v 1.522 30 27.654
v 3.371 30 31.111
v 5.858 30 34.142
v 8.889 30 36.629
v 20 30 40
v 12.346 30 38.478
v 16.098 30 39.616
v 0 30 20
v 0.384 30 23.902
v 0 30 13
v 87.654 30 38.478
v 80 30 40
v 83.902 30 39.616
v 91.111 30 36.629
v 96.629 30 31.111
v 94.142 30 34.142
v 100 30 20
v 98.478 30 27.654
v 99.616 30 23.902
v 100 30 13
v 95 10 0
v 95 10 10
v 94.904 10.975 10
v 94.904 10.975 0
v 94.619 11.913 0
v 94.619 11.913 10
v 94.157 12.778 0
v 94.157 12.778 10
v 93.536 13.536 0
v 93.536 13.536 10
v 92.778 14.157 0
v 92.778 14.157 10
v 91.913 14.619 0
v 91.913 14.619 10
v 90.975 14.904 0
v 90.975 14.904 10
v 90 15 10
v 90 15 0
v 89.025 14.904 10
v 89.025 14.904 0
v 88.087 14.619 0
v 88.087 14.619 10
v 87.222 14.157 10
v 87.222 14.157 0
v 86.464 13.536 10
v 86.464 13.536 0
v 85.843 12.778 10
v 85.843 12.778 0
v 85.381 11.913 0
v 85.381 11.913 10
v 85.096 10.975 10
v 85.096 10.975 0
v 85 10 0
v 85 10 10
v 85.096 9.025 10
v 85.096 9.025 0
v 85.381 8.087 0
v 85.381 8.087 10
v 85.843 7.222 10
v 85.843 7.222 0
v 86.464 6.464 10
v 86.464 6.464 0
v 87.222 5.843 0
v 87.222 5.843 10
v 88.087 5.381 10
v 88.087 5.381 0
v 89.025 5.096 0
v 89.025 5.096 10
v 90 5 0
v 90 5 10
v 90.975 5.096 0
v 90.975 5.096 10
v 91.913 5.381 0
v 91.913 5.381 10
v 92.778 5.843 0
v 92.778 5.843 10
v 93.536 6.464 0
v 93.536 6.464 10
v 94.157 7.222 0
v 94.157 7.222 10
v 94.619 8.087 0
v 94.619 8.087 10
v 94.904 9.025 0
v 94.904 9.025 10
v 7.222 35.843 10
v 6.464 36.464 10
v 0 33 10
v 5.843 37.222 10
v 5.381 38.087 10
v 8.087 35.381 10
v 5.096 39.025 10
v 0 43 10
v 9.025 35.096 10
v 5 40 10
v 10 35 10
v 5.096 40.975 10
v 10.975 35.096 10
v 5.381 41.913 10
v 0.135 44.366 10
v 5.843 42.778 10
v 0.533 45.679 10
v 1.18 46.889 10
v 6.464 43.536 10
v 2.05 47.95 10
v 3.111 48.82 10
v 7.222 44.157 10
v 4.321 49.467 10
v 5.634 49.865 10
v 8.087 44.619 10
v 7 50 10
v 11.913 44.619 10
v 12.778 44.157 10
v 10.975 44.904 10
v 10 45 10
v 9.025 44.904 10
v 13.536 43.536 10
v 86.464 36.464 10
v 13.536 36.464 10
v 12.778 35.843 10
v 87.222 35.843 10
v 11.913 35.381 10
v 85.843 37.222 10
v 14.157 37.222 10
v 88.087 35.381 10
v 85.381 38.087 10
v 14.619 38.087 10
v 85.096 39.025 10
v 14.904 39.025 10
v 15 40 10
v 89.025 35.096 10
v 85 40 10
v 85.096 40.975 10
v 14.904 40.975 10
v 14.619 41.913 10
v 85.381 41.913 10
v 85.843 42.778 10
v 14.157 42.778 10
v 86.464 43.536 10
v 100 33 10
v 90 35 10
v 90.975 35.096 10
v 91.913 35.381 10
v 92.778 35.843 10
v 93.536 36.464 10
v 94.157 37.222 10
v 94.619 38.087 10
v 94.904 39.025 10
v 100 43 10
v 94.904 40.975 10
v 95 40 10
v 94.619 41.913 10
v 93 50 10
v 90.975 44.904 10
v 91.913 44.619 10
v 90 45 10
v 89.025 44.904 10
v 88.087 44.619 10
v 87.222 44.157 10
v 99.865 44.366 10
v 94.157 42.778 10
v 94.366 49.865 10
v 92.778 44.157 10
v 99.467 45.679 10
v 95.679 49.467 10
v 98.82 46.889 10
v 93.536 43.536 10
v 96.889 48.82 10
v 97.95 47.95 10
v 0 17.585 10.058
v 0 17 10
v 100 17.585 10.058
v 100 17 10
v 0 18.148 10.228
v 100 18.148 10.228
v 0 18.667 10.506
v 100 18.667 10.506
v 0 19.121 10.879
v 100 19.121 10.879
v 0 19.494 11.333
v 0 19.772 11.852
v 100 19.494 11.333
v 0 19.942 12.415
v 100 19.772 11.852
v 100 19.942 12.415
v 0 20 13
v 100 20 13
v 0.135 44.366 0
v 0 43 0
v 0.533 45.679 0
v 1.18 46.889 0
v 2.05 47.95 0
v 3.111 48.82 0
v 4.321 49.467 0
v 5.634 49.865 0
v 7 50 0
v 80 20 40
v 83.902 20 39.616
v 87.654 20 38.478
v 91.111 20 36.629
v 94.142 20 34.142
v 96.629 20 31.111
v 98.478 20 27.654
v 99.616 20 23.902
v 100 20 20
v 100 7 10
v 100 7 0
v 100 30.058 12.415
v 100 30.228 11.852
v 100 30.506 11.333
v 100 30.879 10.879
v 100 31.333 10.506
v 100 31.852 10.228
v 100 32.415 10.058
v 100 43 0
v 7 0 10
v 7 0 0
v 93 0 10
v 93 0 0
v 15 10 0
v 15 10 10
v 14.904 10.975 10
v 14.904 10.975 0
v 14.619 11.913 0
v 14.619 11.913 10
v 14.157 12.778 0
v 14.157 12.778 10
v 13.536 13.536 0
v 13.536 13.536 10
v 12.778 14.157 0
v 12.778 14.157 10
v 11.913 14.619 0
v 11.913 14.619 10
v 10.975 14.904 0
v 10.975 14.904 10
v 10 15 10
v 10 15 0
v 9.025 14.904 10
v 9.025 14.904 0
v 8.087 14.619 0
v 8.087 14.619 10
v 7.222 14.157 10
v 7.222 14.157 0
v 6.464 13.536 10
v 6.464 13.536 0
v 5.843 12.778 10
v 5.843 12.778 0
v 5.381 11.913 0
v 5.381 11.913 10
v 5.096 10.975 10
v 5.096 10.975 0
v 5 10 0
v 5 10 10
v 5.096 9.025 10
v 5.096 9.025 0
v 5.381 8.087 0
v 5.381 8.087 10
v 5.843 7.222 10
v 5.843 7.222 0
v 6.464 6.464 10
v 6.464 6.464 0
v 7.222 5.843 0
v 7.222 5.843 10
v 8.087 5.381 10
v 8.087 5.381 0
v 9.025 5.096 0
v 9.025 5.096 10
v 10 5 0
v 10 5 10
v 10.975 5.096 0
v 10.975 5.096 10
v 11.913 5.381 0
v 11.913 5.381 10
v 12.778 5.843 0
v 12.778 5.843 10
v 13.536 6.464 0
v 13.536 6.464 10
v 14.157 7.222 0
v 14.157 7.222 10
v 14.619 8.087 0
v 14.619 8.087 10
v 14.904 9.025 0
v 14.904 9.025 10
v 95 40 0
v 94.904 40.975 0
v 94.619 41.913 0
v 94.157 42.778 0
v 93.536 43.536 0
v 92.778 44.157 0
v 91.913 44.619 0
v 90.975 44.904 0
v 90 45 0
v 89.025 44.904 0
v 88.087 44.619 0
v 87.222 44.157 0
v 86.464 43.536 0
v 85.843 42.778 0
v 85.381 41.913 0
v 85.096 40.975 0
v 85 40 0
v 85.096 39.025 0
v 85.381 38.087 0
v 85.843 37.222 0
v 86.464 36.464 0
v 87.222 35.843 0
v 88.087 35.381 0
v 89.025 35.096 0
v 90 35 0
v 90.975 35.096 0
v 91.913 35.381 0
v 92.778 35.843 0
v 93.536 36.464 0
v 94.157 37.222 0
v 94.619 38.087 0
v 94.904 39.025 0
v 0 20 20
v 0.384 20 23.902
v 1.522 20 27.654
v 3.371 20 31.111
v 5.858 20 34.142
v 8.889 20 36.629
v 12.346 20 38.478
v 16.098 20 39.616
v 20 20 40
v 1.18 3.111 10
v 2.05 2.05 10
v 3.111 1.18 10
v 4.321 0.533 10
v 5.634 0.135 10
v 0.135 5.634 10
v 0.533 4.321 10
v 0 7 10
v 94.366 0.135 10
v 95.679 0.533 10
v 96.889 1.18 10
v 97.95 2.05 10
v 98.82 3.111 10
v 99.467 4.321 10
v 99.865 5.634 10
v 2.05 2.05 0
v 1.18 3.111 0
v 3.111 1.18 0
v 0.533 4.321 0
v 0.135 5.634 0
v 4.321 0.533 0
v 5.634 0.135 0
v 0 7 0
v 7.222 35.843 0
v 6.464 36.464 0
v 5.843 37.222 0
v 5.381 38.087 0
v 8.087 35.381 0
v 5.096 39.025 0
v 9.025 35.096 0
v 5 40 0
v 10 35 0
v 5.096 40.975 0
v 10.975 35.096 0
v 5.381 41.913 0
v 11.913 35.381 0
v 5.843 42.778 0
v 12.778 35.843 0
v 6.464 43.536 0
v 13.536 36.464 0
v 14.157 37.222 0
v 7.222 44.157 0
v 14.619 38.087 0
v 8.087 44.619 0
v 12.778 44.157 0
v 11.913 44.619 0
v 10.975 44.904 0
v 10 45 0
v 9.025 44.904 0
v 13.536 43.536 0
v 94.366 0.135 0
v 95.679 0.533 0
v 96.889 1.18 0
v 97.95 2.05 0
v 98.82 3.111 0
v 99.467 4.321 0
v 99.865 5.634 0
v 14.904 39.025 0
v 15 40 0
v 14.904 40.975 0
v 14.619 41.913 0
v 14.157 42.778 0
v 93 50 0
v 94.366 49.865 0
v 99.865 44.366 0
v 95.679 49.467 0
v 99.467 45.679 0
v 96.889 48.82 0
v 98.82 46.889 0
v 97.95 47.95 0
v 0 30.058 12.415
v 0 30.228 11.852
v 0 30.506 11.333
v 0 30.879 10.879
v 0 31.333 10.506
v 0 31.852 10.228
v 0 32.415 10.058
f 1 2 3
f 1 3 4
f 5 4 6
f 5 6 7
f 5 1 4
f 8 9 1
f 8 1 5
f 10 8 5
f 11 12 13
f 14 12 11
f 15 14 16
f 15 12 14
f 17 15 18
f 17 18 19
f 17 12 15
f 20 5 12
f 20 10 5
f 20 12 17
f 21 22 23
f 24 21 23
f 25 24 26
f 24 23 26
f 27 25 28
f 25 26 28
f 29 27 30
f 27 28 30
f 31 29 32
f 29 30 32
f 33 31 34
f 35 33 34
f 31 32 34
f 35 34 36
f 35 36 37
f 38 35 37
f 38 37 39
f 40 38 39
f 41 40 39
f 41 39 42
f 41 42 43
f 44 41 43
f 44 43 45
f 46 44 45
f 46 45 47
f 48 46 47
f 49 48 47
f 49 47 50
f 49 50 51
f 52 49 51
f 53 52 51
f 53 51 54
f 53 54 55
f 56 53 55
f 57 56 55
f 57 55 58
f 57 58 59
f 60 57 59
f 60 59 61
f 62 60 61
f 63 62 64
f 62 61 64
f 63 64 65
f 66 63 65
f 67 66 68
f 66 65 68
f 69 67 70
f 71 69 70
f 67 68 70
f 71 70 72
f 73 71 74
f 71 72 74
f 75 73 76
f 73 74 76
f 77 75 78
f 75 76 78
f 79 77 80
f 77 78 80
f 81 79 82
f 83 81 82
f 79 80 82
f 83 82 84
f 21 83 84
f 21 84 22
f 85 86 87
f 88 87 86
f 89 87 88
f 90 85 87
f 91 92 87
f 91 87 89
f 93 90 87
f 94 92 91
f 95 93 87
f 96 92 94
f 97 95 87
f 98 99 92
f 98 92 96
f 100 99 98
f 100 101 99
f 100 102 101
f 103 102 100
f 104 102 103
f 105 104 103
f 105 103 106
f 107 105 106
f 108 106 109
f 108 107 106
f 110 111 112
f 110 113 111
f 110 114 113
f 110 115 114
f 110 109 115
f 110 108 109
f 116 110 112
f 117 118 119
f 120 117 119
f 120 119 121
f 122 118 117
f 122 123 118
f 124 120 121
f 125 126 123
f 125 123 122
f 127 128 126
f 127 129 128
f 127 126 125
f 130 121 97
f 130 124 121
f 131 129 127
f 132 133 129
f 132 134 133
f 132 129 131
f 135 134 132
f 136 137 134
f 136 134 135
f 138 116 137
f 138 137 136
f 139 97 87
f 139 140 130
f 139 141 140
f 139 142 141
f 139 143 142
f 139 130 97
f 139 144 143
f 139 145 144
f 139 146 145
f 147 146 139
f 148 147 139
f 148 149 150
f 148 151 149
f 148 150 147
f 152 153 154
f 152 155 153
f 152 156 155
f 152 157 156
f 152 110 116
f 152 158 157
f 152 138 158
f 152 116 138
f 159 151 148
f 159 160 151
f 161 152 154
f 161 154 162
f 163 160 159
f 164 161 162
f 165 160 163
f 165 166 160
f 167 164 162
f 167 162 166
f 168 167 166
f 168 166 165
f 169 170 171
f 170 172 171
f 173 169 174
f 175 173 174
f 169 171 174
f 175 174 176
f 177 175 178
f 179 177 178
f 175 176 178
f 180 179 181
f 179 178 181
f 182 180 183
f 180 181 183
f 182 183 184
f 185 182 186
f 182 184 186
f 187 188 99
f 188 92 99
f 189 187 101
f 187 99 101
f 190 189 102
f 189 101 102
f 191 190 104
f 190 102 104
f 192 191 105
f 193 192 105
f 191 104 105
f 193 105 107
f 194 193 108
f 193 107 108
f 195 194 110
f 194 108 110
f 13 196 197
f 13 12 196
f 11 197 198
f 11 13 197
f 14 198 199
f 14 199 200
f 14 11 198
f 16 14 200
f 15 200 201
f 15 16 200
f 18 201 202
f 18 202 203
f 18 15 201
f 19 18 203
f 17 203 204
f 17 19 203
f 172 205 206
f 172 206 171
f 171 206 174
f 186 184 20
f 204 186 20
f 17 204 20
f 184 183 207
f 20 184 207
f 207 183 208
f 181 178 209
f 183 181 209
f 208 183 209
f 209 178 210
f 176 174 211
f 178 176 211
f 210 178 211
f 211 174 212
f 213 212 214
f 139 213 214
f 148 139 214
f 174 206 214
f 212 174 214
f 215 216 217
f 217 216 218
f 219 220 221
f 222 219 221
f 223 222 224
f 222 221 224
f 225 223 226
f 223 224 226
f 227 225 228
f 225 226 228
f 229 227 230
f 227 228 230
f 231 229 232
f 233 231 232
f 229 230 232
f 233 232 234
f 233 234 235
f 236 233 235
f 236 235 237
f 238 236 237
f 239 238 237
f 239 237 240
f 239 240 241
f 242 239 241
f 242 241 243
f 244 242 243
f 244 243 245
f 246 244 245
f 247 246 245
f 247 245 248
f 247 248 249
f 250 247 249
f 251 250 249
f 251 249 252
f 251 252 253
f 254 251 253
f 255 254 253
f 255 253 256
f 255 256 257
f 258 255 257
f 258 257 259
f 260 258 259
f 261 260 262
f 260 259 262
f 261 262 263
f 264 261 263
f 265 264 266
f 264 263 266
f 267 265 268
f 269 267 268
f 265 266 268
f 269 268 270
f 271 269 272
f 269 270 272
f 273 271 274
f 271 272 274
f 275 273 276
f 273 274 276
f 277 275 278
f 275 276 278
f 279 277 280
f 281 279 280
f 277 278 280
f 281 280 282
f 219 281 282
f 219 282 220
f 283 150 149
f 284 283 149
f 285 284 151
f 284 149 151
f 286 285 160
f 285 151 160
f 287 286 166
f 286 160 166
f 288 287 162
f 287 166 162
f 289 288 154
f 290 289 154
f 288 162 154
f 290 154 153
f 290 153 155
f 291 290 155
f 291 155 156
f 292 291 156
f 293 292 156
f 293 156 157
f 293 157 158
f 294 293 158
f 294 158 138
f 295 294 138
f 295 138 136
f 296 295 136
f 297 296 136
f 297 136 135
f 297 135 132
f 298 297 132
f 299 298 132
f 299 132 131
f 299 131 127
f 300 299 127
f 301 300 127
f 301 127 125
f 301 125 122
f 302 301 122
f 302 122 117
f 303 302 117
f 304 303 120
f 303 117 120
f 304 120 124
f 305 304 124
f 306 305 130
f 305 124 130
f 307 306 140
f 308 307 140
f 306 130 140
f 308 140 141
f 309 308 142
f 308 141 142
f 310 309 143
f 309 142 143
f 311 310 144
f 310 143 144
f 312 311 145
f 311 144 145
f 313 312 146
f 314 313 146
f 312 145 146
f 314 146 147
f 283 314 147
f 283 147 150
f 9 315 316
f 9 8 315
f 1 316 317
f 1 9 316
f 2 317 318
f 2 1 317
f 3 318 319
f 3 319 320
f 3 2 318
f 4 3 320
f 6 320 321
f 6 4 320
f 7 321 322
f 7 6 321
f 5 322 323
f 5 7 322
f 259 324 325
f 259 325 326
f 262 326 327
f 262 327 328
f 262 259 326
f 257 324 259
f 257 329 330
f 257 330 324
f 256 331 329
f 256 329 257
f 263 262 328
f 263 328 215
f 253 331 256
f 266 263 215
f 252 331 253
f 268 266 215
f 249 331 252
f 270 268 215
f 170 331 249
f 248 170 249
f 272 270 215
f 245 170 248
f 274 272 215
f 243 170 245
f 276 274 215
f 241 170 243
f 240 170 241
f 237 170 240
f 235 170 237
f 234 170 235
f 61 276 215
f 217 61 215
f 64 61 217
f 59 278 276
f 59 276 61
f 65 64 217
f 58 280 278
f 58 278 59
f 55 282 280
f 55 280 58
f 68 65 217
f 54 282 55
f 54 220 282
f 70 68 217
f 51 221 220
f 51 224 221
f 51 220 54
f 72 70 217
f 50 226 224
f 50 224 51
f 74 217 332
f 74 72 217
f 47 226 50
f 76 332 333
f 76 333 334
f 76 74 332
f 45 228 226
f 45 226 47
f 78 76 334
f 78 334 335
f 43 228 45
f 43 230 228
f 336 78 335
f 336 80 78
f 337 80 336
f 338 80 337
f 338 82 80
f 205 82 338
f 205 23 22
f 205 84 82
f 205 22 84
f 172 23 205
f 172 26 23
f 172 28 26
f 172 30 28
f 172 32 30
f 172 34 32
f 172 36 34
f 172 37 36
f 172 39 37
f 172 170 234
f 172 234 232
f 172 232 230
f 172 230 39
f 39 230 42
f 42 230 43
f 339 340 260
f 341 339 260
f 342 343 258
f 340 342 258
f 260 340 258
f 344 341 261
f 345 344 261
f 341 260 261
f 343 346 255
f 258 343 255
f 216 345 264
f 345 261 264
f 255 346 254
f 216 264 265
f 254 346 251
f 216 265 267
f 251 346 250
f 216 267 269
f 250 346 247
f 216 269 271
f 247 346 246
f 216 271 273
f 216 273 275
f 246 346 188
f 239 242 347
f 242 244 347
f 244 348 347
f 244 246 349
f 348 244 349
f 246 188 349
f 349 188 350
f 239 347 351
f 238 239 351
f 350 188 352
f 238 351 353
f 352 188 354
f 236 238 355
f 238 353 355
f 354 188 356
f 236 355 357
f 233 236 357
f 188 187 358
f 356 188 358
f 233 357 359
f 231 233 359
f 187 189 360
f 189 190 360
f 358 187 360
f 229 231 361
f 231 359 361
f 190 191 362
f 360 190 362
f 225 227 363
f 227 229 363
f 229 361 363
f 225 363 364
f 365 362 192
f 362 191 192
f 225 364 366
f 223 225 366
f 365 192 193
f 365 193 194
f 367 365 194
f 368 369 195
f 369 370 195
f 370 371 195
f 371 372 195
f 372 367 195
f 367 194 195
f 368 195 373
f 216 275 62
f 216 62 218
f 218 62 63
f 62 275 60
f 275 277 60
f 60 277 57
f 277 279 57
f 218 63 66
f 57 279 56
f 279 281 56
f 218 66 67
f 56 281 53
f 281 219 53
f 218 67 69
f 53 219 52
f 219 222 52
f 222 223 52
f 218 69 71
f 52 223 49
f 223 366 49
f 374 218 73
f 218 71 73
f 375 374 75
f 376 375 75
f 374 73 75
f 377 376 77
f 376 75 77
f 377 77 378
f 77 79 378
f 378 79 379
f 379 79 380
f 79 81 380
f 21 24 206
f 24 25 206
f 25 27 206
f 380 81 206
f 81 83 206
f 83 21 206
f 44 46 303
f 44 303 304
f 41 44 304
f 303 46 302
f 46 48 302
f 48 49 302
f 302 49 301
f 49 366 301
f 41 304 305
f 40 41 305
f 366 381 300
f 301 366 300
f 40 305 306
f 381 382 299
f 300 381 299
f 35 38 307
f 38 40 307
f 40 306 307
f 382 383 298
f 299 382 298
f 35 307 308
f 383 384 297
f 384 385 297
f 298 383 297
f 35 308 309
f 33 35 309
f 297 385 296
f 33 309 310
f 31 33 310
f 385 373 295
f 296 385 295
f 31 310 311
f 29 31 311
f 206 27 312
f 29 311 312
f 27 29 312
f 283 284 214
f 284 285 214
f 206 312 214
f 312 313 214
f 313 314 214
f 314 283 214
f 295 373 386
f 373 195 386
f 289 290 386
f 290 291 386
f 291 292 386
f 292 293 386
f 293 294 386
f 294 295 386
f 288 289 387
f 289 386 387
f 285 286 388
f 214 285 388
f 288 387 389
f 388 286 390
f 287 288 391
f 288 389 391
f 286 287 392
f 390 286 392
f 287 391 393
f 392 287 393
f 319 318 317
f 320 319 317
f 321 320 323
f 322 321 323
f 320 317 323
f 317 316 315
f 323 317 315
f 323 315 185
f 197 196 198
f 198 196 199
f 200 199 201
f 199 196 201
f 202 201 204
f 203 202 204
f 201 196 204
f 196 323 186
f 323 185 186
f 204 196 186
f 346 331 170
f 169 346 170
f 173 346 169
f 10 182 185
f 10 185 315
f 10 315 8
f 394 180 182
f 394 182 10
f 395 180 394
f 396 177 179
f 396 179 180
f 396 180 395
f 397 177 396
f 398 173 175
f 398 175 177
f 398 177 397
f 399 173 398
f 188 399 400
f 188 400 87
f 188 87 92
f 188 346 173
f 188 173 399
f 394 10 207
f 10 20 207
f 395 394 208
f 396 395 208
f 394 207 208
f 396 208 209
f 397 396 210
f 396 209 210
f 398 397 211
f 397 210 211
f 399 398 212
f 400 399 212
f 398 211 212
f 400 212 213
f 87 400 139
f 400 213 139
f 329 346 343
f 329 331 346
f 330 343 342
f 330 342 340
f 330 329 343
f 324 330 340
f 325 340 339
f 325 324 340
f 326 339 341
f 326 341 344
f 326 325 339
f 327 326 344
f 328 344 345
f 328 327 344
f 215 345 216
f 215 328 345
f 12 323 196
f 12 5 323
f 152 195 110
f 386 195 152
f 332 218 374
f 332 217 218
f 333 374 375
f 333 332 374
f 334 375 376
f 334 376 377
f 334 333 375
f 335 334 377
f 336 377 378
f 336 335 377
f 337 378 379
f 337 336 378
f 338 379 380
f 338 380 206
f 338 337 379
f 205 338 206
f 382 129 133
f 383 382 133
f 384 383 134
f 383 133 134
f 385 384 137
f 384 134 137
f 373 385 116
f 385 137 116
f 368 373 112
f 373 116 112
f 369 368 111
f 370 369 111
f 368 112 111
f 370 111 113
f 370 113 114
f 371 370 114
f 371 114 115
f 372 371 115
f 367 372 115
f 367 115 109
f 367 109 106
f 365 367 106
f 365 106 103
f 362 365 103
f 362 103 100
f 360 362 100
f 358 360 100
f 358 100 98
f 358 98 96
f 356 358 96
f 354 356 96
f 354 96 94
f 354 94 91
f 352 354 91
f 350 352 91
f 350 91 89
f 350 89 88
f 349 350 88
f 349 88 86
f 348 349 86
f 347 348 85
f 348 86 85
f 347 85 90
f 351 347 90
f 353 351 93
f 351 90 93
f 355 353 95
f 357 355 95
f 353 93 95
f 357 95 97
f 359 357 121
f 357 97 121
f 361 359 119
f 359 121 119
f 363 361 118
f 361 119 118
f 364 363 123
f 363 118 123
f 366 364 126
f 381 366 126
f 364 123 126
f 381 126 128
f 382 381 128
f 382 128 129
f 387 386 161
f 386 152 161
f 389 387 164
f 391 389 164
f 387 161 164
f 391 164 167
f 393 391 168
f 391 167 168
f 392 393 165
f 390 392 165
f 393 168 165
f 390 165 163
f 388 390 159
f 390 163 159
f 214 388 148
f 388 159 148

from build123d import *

# Parameters (mm, degrees)
SKETCH_W     = 100
SKETCH_H     = 50
PAD_DEPTH    = 10
SKETCH001_W  = 100
SKETCH001_H  = 10
PAD001_DEPTH = 30
SKETCH002_R  = 5
POCKET_DEPTH = 10.001
FILLET_R     = 20
FILLET001_R  = 7
FILLET002_R  = 3


with BuildPart() as part:
    # Sketch → Pad (new body)
    with BuildSketch(Plane.XY):
        with Locations((50, 25)):
            Rectangle(SKETCH_W, SKETCH_H)
    extrude(amount=PAD_DEPTH)

    # Sketch001 (on Face6 of Pad) → Pad001 (join)
    with BuildSketch(Plane.XY.offset(10)):
        with Locations((50, 25)):
            Rectangle(SKETCH001_W, SKETCH001_H)
    extrude(amount=PAD001_DEPTH)

    # Sketch002 (on Face5 of Pad001) → Pocket (cut, through all)
    with BuildSketch(Plane.XY.offset(10)):
        with Locations((10, 40)):
            Circle(SKETCH002_R)
        with Locations((90, 40)):
            Circle(SKETCH002_R)
        with Locations((10, 10)):
            Circle(SKETCH002_R)
        with Locations((90, 10)):
            Circle(SKETCH002_R)
    extrude(amount=-POCKET_DEPTH, mode=Mode.SUBTRACT)

    # Fillet
    fillet_edges = [part.edges().sort_by_distance(p)[0] for p in [
        (100, 25, 40),
        (0, 25, 40),
    ]]
    fillet(fillet_edges, radius=FILLET_R)

    # Fillet001
    fillet001_edges = [part.edges().sort_by_distance(p)[0] for p in [
        (100, 0, 5),
        (100, 50, 5),
        (0, 0, 5),
        (0, 50, 5),
    ]]
    fillet(fillet001_edges, radius=FILLET001_R)

    # Fillet002
    fillet002_edges = [part.edges().sort_by_distance(p)[0] for p in [
        (50, 20, 10),
        (50, 30, 10),
    ]]
    fillet(fillet002_edges, radius=FILLET002_R)


solid = part.part
